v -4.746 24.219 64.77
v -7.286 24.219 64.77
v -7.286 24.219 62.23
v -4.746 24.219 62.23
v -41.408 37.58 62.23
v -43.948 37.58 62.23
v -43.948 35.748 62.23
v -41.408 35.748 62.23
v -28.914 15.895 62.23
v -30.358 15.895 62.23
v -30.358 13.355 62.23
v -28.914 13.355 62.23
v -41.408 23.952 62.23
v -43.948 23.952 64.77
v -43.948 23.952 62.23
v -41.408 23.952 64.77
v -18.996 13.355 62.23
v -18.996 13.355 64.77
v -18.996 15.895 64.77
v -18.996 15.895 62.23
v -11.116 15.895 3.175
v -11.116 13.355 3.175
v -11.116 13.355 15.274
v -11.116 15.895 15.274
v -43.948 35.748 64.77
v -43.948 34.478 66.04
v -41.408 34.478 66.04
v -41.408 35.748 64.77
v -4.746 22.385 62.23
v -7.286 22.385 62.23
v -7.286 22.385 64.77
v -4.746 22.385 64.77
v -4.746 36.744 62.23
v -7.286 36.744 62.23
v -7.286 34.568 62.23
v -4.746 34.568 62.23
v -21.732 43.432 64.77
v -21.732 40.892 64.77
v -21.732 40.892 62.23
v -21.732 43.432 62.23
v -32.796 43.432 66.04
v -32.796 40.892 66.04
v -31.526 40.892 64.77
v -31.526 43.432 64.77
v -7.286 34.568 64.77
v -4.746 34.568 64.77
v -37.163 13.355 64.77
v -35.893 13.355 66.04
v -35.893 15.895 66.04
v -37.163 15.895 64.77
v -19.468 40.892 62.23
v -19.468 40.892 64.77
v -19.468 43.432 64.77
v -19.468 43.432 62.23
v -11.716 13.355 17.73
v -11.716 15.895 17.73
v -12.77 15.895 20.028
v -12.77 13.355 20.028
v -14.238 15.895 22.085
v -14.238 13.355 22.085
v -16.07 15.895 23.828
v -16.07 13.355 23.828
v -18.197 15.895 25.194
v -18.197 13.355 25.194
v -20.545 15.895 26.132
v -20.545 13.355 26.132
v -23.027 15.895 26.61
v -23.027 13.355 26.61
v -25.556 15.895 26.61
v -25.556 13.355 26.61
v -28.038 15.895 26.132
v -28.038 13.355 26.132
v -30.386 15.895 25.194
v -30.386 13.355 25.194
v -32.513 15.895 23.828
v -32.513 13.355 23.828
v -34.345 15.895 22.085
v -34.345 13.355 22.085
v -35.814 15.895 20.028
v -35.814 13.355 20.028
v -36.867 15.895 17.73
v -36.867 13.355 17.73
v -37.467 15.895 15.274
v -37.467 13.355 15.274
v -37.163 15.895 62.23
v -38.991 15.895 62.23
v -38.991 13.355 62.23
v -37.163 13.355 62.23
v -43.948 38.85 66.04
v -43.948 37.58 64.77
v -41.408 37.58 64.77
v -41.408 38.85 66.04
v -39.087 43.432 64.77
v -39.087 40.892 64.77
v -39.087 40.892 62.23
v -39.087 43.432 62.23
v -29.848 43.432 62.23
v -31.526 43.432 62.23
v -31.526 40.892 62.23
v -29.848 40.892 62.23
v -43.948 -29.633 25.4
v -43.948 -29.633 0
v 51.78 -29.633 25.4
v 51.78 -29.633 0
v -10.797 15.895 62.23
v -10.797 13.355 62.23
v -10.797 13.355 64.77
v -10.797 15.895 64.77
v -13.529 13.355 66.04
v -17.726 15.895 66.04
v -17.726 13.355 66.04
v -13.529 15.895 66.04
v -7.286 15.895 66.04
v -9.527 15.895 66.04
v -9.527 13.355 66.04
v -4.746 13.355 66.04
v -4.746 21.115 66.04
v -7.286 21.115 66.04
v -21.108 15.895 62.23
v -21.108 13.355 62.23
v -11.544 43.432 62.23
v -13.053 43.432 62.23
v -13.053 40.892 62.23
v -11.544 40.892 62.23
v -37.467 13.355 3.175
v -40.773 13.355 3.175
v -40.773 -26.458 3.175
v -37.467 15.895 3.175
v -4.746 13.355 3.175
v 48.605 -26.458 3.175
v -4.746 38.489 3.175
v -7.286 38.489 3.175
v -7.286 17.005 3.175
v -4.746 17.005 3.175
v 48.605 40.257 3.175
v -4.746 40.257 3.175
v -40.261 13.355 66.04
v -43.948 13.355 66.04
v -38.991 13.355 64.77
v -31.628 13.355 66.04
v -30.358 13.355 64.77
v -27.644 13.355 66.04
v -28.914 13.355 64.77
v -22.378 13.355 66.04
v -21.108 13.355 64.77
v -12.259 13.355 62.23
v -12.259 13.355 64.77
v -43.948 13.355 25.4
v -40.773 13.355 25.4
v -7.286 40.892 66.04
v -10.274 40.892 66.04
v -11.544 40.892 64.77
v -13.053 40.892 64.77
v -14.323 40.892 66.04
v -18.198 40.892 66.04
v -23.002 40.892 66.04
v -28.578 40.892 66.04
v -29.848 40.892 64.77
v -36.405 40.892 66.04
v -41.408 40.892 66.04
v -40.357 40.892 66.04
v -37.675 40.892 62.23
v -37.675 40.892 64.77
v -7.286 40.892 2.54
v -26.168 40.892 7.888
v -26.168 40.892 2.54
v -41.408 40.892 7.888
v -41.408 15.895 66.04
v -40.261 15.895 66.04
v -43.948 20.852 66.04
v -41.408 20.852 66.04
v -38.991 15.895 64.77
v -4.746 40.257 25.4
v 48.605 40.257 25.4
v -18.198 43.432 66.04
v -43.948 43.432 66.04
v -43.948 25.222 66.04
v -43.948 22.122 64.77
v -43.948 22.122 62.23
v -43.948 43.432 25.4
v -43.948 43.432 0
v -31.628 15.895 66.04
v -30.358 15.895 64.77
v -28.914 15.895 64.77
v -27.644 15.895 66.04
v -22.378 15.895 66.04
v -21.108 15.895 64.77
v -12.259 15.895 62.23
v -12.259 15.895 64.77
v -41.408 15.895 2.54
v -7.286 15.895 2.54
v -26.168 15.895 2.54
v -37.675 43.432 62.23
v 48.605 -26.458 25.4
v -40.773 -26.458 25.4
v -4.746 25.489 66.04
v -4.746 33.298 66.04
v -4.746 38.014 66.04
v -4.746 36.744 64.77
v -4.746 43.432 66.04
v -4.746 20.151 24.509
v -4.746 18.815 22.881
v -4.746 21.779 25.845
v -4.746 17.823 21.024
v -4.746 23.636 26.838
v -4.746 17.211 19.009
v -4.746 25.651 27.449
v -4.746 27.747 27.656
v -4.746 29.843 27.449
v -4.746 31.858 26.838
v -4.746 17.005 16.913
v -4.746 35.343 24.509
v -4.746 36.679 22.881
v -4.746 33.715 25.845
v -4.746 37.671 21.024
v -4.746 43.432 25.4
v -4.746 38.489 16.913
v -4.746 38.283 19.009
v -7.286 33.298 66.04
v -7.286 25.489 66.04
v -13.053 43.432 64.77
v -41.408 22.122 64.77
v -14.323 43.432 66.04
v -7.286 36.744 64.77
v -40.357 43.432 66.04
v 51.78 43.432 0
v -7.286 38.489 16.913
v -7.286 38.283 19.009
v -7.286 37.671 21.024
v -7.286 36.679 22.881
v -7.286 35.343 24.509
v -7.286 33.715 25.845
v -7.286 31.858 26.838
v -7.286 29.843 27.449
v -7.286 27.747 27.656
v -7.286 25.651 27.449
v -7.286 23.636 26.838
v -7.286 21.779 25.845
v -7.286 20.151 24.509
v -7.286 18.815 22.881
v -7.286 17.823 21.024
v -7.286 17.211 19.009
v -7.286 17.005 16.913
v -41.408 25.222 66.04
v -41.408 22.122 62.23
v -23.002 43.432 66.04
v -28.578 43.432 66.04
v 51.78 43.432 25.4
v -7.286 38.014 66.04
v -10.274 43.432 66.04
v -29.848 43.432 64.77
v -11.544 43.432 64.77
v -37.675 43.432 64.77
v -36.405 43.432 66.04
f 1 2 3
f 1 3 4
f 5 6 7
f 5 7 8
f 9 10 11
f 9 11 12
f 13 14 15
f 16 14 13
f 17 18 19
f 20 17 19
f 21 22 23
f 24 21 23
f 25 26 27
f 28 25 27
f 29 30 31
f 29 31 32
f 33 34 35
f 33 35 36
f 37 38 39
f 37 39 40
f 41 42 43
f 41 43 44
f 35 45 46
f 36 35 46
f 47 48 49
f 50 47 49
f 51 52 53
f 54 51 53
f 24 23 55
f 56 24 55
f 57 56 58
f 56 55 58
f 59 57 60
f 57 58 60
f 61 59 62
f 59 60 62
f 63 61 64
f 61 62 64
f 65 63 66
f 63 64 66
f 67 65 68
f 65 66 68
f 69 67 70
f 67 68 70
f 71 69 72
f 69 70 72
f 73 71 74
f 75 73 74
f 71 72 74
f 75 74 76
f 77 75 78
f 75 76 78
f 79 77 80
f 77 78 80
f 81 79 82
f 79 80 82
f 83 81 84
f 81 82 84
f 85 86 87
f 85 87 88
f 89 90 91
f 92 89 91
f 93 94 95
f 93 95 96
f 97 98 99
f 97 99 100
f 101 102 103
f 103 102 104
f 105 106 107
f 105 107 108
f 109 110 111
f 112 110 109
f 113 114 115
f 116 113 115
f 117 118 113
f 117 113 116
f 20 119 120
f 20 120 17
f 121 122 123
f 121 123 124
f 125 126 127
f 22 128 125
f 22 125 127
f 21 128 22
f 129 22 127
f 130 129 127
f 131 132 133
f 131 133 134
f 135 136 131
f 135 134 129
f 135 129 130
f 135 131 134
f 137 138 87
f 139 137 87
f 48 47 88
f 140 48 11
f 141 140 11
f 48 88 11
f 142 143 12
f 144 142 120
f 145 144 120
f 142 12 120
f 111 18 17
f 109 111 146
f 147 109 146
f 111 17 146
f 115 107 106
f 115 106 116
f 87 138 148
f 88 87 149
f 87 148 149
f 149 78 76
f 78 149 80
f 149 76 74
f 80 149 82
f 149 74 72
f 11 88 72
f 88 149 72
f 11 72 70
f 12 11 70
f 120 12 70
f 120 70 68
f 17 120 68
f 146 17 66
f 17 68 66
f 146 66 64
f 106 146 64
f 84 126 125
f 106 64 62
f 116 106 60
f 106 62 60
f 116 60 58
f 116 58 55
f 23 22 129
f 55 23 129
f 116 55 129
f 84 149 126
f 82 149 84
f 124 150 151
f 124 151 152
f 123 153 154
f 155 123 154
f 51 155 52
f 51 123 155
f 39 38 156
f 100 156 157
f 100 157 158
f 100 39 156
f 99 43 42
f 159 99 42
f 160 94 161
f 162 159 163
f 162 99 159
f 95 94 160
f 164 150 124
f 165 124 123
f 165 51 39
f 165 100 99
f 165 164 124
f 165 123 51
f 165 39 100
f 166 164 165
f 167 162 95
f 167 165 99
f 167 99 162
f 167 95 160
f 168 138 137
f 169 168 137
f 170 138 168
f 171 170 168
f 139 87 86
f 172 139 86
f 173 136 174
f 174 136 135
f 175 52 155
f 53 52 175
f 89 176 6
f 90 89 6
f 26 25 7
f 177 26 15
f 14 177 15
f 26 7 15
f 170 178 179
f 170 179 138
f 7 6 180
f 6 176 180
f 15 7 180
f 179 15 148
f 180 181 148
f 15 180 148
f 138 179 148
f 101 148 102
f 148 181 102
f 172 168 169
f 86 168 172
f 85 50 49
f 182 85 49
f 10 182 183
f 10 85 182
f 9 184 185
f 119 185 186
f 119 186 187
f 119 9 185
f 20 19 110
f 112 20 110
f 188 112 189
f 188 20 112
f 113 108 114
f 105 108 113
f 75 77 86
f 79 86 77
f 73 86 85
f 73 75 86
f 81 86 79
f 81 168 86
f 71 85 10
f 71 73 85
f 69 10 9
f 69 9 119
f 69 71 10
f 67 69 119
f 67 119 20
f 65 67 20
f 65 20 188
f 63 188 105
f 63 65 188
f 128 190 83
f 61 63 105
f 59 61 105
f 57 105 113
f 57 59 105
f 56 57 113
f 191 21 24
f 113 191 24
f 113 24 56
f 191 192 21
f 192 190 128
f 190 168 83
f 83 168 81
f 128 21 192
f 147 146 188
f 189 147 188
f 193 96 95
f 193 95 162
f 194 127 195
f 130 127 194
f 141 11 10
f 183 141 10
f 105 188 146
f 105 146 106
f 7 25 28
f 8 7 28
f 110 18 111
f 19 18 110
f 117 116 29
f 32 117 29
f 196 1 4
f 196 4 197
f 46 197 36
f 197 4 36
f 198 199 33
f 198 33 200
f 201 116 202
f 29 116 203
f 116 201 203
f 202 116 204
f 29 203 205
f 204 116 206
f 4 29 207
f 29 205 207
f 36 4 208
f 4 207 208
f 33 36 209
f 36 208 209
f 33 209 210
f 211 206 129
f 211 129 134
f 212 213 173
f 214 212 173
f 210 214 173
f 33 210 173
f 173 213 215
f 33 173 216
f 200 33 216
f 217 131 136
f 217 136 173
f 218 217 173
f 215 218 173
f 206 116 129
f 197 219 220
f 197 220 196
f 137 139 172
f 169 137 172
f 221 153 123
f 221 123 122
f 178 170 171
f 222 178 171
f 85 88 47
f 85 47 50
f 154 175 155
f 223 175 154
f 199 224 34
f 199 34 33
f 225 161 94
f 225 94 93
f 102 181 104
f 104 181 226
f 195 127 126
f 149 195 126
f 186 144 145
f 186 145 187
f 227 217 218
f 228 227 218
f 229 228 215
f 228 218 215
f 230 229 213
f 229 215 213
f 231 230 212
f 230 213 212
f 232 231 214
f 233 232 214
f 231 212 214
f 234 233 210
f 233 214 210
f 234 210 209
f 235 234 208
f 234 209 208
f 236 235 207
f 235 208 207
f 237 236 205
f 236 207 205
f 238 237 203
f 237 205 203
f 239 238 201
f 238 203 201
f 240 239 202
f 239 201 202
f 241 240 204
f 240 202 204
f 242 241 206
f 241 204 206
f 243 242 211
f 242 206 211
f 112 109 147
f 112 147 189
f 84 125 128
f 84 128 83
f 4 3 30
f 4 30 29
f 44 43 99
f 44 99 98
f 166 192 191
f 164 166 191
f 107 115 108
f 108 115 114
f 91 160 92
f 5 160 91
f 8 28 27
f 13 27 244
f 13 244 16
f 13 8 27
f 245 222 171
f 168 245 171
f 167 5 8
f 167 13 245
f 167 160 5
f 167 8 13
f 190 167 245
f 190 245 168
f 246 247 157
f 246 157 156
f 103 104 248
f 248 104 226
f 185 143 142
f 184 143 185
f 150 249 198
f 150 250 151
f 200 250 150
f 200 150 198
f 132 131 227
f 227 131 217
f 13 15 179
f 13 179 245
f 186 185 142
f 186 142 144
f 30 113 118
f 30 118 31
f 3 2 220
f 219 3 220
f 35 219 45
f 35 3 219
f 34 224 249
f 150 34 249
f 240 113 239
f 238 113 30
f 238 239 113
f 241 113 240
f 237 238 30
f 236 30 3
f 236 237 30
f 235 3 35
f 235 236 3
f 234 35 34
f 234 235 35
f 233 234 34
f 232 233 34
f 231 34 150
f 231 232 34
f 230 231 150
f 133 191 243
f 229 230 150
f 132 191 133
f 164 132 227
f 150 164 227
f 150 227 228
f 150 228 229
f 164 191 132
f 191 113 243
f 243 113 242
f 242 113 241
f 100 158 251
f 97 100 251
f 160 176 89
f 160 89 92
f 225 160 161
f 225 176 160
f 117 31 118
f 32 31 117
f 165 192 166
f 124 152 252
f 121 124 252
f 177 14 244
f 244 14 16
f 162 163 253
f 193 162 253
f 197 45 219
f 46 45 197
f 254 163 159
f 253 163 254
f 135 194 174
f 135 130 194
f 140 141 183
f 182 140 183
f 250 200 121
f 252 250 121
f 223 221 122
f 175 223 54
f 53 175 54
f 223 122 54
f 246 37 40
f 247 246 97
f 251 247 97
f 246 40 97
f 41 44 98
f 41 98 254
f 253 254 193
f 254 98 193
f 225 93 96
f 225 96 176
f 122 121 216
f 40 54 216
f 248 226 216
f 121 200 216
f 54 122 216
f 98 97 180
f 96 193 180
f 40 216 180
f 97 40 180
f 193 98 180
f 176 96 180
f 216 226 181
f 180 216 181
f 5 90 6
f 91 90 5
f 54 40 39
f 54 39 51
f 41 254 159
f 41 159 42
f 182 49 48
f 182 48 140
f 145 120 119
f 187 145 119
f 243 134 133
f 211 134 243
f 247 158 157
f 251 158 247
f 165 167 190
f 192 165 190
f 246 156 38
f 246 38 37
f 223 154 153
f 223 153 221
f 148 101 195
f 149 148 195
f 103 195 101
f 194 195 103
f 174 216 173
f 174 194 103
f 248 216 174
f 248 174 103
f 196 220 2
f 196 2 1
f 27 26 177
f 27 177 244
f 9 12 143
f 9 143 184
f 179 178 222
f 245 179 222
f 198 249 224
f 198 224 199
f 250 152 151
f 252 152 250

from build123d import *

# Parameters (mm, degrees)
F0_W         = 95.7279466093
F0_H         = 73.0648599565
F1_DEPTH     = 25.4
F2_T         = -3.175
F3_W         = 36.0267900012
F3_H         = 26.902483505
F4_DEPTH     = 22.225
F6_DEPTH     = 38.1
F7_T         = 2.54
F7_T3_DEPTH  = 8.255
F7_T5_DEPTH  = 8.255
F7_T7_DEPTH  = 27.305
F7_T9_DEPTH  = 31.982483505
F7_T11_DEPTH = 41.1067900012
F7_T13_DEPTH = 58.431156608
F7_T15_DEPTH = 71.7948599565
F7_T17_DEPTH = 94.4579466093
F7_T19_DEPTH = 44.8923764515
F8_W         = 26.3507906348
F8_H         = 12.0985915035
F9_DEPTH     = 3.175
F10_W        = 21.4841477573
F10_H        = 13.7384773314
F11_DEPTH    = 3.175
F13_W        = 1.8280372024
F13_H        = 2.54
F13_W_2      = 1.4438778162
F13_W_3      = 1.4618895948
F13_W_4      = 2.1120999008
F13_W_5      = 2.54
F13_H_2      = 1.8293876201
F13_H_3      = 1.8326565623
F13_W_6      = 1.4120712876
F13_W_7      = 1.6781240702
F13_W_8      = 2.2645629942
F13_W_9      = 1.5091551468
F13_H_4      = 2.1763034165
F13_H_5      = 1.8344689161
F14_DEPTH    = 1.27
F15_DEPTH    = 2.54
F16_SIZE     = 1.27
F17_SIZE     = 1.27
F18_SIZE     = 1.27
F19_SIZE     = 1.27
F20_DEPTH    = 15.24


# Not quite as in the source:
# - a shell that OpenCascade refuses in one call is made with other operations: the cavity is built on its own and cut out


with BuildPart() as f1:
    # F0 (on Top) → F1 (new body)
    with BuildSketch(Plane.XY):
        with Locations((3.9161536843, 6.8996157497)):
            Rectangle(F0_W, F0_H)
    extrude(amount=F1_DEPTH)

    # F2
    f2_openings = [f1.faces().sort_by_distance(p)[0] for p in [
        (3.916154, 6.899616, 25.4),
    ]]
    offset(amount=F2_T, openings=f2_openings)

    # F3 (on face) → F4 (join)
    with BuildSketch(Plane.XY.offset(3.175)):
        with Locations((-22.7594246197, 26.8058039755)):
            Rectangle(F3_W, F3_H)
    extrude(amount=F4_DEPTH)

    # F5 (on face) → F6 (join)
    with BuildSketch(Plane.XY.offset(25.4)):
        Polygon((-43.9478196204, 13.354562223), (-40.7728196204, 13.354562223), (-4.7460296191, 13.354562223), (-4.7460296191, 40.257045728), (-4.7460296191, 43.432045728), (-43.9478196204, 43.432045728), align=None)
    extrude(amount=F6_DEPTH)

    # F7: shell of thickness 2.54, made by hand


with BuildPart() as f7_core1:
    # F7_t2: copy of F1
    add(f1.part)

    # the walls: a layer under each face that stays
    f7_faces = [f7_core1.faces().sort_by_distance(p)[0] for p in [
        (-43.9478196204, 31.2545690686, 52.9166666667),
        (3.9161536843, 6.8996157497, 0),
        (51.7801269889, 6.8996157497, 12.7),
        (3.9161536843, -29.6328142285, 12.7),
        (-40.7568880667, -27.1973188967, 25.4),
        (-4.7460296191, 28.3933039755, 33.3375),
        (3.9161536843, 6.8996157497, 3.175),
        (21.9295486849, 40.257045728, 14.2875),
        (48.6051269889, 6.8996157497, 14.2875),
        (3.9161536843, -26.4578142285, 14.2875),
        (-40.7728196204, -6.5516260028, 14.2875),
        (-24.3469246197, 13.354562223, 33.3375),
        (35.8254692207, 43.432045728, 10.5833333333),
    ]]
    thicken(f7_faces, amount=-F7_T, mode=Mode.SUBTRACT)

    # F7_s4 → F7_t3 (cut)
    with BuildSketch(Plane.YZ.offset(-46.4878196204)):
        Polygon((13.329162223, 25.4254), (13.354562223, 22.86), (15.894562223, 22.86), (15.894562223, 25.4), align=None)
    extrude(amount=F7_T3_DEPTH, mode=Mode.SUBTRACT)

    # F7_s6 → F7_t5 (cut)
    with BuildSketch(Plane.XZ.offset(-45.972045728)):
        Polygon((-4.7206296191, 25.4254), (-4.7460296191, 22.86), (-7.2860296191, 22.86), (-7.2860296191, 25.4), align=None)
    extrude(amount=F7_T5_DEPTH, mode=Mode.SUBTRACT)

    # F7_s8 → F7_t7 (cut)
    with BuildSketch(Plane.XY.offset(0.635)):
        Polygon((-4.7206296191, 40.231645728), (-7.2860296191, 40.257045728), (-7.2860296191, 42.797045728), (-4.7460296191, 42.797045728), align=None)
        Polygon((48.5797269889, 40.231645728), (48.6051269889, 42.797045728), (51.1451269889, 42.797045728), (51.1451269889, 40.257045728), align=None)
        Polygon((48.5797269889, -26.4324142285), (51.1451269889, -26.4578142285), (51.1451269889, -28.9978142285), (48.6051269889, -28.9978142285), align=None)
        Polygon((-40.7474196204, -26.4324142285), (-40.7728196204, -28.9978142285), (-43.3128196204, -28.9978142285), (-43.3128196204, -26.4578142285), align=None)
        Polygon((-40.7474196204, 13.329162223), (-43.3128196204, 13.354562223), (-43.3128196204, 15.894562223), (-40.7728196204, 15.894562223), align=None)
    extrude(amount=F7_T7_DEPTH, mode=Mode.SUBTRACT)

    # F7_s10 → F7_t9 (cut)
    with BuildSketch(Plane.XZ.offset(-42.797045728)):
        Polygon((-4.7206296191, 3.2004), (-7.2860296191, 3.175), (-7.2860296191, 0.635), (-4.7460296191, 0.635), align=None)
    extrude(amount=F7_T9_DEPTH, mode=Mode.SUBTRACT)

    # F7_s12 → F7_t11 (cut)
    with BuildSketch(Plane.YZ.offset(-43.3128196204)):
        Polygon((13.329162223, 3.2004), (13.354562223, 0.635), (15.894562223, 0.635), (15.894562223, 3.175), align=None)
    extrude(amount=F7_T11_DEPTH, mode=Mode.SUBTRACT)

    # F7_s14 → F7_t13 (cut)
    with BuildSketch(Plane.YZ.offset(-7.2860296191)):
        Polygon((40.231645728, 3.2004), (40.257045728, 0.635), (42.797045728, 0.635), (42.797045728, 3.175), align=None)
    extrude(amount=F7_T13_DEPTH, mode=Mode.SUBTRACT)

    # F7_s16 → F7_t15 (cut)
    with BuildSketch(Plane.XZ.offset(-42.797045728)):
        Polygon((48.5797269889, 3.2004), (48.6051269889, 0.635), (51.1451269889, 0.635), (51.1451269889, 3.175), align=None)
    extrude(amount=F7_T15_DEPTH, mode=Mode.SUBTRACT)

    # F7_s18 → F7_t17 (cut)
    with BuildSketch(Plane.YZ.offset(-43.3128196204)):
        Polygon((-26.4324142285, 3.2004), (-26.4578142285, 0.635), (-28.9978142285, 0.635), (-28.9978142285, 3.175), align=None)
    extrude(amount=F7_T17_DEPTH, mode=Mode.SUBTRACT)

    # F7_s20 → F7_t19 (cut)
    with BuildSketch(Plane.XZ.offset(-15.894562223)):
        Polygon((-40.7474196204, 3.2004), (-40.7728196204, 0.635), (-43.3128196204, 0.635), (-43.3128196204, 3.175), align=None)
    extrude(amount=F7_T19_DEPTH, mode=Mode.SUBTRACT)


with BuildPart() as f1_1:
    add(f1.part)

    # what is left inside the walls is the cavity
    f7_cavity = [f7_core1.part.solids().sort_by_distance(p)[0] for p in [
        (-24.346925, 40.866646, 43.18),
    ]]
    add(f7_cavity, mode=Mode.SUBTRACT)

    # F8 (on face) → F9 (cut)
    with BuildSketch(Plane.XZ.offset(-13.354562223)):
        with BuildLine():
            ThreePointArc((-11.1161526293, 15.2735915035), (-24.2915479466, 26.6703128698), (-37.466943264, 15.2735915035))
            Line((-37.466943264, 15.2735915035), (-11.1161526293, 15.2735915035))
        make_face()
        with Locations((-24.2915479466, 9.2242957518)):
            Rectangle(F8_W, F8_H)
    extrude(amount=-F9_DEPTH, mode=Mode.SUBTRACT)

    # F10 (on face) → F11 (cut)
    with BuildSketch(Plane.YZ.offset(-4.7460296191)):
        with BuildLine():
            Line((17.0049779117, 16.9134773314), (38.489125669, 16.9134773314))
            ThreePointArc((38.489125669, 16.9134773314), (27.7470517904, 27.65555121), (17.0049779117, 16.9134773314))
        make_face()
        with Locations((27.7470517904, 10.0442386657)):
            Rectangle(F10_W, F10_H)
    extrude(amount=-F11_DEPTH, mode=Mode.SUBTRACT)

    # F13 (on face) → F14 (cut)
    with BuildSketch(Plane.XY.offset(63.5)):
        with Locations((-38.0768813193, 14.624562223)):
            Rectangle(F13_W, F13_H)
        with Locations((-29.6358391643, 14.624562223)):
            Rectangle(F13_W_2, F13_H)
        with Locations((-11.5280598402, 14.624562223)):
            Rectangle(F13_W_3, F13_H)
        with Locations((-20.0523110107, 14.624562223)):
            Rectangle(F13_W_4, F13_H)
        with Locations((-42.6778196204, 23.0370378122)):
            Rectangle(F13_W_5, F13_H_2)
        with Locations((-42.6778196204, 36.6639345884)):
            Rectangle(F13_W_5, F13_H_3)
        with Locations((-38.3811965585, 42.162045728)):
            Rectangle(F13_W_6, F13_H)
        with Locations((-30.6867770851, 42.162045728)):
            Rectangle(F13_W_7, F13_H)
        with Locations((-20.6000227481, 42.162045728)):
            Rectangle(F13_W_8, F13_H)
        with Locations((-12.2982370667, 42.162045728)):
            Rectangle(F13_W_9, F13_H)
        with Locations((-6.0160296191, 35.6560815126)):
            Rectangle(F13_W_5, F13_H_4)
        with Locations((-6.0160296191, 23.3017643914)):
            Rectangle(F13_W_5, F13_H_5)
    extrude(amount=-F14_DEPTH, mode=Mode.SUBTRACT)

    # F15 (add): faces of the model
    f15_faces = [f1_1.faces().sort_by_distance(p)[0] for p in [
        (-6.8630827973, 16.9610565444, 63.5),
        (-6.0160296191, 29.3934643269, 63.5),
        (-7.3381229169, 40.8948611138, 63.5),
        (-16.2602779455, 42.162045728, 63.5),
        (-25.7900096476, 42.162045728, 63.5),
        (-34.6005000174, 42.162045728, 63.5),
        (-41.9877249706, 40.9763533581, 63.5),
        (-42.6778196204, 29.8496689647, 63.5),
        (-42.1422453408, 17.0655675422, 63.5),
        (-33.7603203952, 14.624562223, 63.5),
        (-25.0111306086, 14.624562223, 63.5),
        (-15.6276328489, 14.624562223, 63.5),
    ]]
    extrude(f15_faces, amount=F15_DEPTH)

    # F16
    f16_edges = [f1_1.edges().sort_by_distance(p)[0] for p in [
        (-10.797115, 14.624562, 66.04),
        (-12.259005, 14.624562, 66.04),
    ]]
    chamfer(f16_edges, length=F16_SIZE)

    # F17
    f17_edges = [f1_1.edges().sort_by_distance(p)[0] for p in [
        (-6.01603, 22.38453, 66.04),
        (-6.01603, 24.218999, 66.04),
        (-6.01603, 34.56793, 66.04),
        (-6.01603, 36.744233, 66.04),
    ]]
    chamfer(f17_edges, length=F17_SIZE)

    # F18
    f18_edges = [f1_1.edges().sort_by_distance(p)[0] for p in [
        (-11.543659, 42.162046, 66.04),
        (-13.052815, 42.162046, 66.04),
        (-19.467741, 42.162046, 66.04),
        (-21.732304, 42.162046, 66.04),
        (-39.087232, 42.162046, 66.04),
        (-37.675161, 42.162046, 66.04),
        (-31.525839, 42.162046, 66.04),
        (-29.847715, 42.162046, 66.04),
    ]]
    chamfer(f18_edges, length=F18_SIZE)

    # F19
    f19_edges = [f1_1.edges().sort_by_distance(p)[0] for p in [
        (-42.67782, 37.580263, 66.04),
        (-42.67782, 35.747606, 66.04),
        (-42.67782, 23.951732, 66.04),
        (-42.67782, 22.122344, 66.04),
        (-38.9909, 14.624562, 66.04),
        (-37.162863, 14.624562, 66.04),
        (-30.357778, 14.624562, 66.04),
        (-28.9139, 14.624562, 66.04),
        (-21.108361, 14.624562, 66.04),
        (-18.996261, 14.624562, 66.04),
    ]]
    chamfer(f19_edges, length=F19_SIZE)

    # F12 (on face) → F20 (join)
    with BuildSketch(Plane.YZ.offset(-41.4078196204)):
        Polygon((40.892045728, 2.54), (40.892045728, 7.8878998756), (15.894562223, 2.54), align=None)
    extrude(amount=F20_DEPTH)


solid = f1_1.part
